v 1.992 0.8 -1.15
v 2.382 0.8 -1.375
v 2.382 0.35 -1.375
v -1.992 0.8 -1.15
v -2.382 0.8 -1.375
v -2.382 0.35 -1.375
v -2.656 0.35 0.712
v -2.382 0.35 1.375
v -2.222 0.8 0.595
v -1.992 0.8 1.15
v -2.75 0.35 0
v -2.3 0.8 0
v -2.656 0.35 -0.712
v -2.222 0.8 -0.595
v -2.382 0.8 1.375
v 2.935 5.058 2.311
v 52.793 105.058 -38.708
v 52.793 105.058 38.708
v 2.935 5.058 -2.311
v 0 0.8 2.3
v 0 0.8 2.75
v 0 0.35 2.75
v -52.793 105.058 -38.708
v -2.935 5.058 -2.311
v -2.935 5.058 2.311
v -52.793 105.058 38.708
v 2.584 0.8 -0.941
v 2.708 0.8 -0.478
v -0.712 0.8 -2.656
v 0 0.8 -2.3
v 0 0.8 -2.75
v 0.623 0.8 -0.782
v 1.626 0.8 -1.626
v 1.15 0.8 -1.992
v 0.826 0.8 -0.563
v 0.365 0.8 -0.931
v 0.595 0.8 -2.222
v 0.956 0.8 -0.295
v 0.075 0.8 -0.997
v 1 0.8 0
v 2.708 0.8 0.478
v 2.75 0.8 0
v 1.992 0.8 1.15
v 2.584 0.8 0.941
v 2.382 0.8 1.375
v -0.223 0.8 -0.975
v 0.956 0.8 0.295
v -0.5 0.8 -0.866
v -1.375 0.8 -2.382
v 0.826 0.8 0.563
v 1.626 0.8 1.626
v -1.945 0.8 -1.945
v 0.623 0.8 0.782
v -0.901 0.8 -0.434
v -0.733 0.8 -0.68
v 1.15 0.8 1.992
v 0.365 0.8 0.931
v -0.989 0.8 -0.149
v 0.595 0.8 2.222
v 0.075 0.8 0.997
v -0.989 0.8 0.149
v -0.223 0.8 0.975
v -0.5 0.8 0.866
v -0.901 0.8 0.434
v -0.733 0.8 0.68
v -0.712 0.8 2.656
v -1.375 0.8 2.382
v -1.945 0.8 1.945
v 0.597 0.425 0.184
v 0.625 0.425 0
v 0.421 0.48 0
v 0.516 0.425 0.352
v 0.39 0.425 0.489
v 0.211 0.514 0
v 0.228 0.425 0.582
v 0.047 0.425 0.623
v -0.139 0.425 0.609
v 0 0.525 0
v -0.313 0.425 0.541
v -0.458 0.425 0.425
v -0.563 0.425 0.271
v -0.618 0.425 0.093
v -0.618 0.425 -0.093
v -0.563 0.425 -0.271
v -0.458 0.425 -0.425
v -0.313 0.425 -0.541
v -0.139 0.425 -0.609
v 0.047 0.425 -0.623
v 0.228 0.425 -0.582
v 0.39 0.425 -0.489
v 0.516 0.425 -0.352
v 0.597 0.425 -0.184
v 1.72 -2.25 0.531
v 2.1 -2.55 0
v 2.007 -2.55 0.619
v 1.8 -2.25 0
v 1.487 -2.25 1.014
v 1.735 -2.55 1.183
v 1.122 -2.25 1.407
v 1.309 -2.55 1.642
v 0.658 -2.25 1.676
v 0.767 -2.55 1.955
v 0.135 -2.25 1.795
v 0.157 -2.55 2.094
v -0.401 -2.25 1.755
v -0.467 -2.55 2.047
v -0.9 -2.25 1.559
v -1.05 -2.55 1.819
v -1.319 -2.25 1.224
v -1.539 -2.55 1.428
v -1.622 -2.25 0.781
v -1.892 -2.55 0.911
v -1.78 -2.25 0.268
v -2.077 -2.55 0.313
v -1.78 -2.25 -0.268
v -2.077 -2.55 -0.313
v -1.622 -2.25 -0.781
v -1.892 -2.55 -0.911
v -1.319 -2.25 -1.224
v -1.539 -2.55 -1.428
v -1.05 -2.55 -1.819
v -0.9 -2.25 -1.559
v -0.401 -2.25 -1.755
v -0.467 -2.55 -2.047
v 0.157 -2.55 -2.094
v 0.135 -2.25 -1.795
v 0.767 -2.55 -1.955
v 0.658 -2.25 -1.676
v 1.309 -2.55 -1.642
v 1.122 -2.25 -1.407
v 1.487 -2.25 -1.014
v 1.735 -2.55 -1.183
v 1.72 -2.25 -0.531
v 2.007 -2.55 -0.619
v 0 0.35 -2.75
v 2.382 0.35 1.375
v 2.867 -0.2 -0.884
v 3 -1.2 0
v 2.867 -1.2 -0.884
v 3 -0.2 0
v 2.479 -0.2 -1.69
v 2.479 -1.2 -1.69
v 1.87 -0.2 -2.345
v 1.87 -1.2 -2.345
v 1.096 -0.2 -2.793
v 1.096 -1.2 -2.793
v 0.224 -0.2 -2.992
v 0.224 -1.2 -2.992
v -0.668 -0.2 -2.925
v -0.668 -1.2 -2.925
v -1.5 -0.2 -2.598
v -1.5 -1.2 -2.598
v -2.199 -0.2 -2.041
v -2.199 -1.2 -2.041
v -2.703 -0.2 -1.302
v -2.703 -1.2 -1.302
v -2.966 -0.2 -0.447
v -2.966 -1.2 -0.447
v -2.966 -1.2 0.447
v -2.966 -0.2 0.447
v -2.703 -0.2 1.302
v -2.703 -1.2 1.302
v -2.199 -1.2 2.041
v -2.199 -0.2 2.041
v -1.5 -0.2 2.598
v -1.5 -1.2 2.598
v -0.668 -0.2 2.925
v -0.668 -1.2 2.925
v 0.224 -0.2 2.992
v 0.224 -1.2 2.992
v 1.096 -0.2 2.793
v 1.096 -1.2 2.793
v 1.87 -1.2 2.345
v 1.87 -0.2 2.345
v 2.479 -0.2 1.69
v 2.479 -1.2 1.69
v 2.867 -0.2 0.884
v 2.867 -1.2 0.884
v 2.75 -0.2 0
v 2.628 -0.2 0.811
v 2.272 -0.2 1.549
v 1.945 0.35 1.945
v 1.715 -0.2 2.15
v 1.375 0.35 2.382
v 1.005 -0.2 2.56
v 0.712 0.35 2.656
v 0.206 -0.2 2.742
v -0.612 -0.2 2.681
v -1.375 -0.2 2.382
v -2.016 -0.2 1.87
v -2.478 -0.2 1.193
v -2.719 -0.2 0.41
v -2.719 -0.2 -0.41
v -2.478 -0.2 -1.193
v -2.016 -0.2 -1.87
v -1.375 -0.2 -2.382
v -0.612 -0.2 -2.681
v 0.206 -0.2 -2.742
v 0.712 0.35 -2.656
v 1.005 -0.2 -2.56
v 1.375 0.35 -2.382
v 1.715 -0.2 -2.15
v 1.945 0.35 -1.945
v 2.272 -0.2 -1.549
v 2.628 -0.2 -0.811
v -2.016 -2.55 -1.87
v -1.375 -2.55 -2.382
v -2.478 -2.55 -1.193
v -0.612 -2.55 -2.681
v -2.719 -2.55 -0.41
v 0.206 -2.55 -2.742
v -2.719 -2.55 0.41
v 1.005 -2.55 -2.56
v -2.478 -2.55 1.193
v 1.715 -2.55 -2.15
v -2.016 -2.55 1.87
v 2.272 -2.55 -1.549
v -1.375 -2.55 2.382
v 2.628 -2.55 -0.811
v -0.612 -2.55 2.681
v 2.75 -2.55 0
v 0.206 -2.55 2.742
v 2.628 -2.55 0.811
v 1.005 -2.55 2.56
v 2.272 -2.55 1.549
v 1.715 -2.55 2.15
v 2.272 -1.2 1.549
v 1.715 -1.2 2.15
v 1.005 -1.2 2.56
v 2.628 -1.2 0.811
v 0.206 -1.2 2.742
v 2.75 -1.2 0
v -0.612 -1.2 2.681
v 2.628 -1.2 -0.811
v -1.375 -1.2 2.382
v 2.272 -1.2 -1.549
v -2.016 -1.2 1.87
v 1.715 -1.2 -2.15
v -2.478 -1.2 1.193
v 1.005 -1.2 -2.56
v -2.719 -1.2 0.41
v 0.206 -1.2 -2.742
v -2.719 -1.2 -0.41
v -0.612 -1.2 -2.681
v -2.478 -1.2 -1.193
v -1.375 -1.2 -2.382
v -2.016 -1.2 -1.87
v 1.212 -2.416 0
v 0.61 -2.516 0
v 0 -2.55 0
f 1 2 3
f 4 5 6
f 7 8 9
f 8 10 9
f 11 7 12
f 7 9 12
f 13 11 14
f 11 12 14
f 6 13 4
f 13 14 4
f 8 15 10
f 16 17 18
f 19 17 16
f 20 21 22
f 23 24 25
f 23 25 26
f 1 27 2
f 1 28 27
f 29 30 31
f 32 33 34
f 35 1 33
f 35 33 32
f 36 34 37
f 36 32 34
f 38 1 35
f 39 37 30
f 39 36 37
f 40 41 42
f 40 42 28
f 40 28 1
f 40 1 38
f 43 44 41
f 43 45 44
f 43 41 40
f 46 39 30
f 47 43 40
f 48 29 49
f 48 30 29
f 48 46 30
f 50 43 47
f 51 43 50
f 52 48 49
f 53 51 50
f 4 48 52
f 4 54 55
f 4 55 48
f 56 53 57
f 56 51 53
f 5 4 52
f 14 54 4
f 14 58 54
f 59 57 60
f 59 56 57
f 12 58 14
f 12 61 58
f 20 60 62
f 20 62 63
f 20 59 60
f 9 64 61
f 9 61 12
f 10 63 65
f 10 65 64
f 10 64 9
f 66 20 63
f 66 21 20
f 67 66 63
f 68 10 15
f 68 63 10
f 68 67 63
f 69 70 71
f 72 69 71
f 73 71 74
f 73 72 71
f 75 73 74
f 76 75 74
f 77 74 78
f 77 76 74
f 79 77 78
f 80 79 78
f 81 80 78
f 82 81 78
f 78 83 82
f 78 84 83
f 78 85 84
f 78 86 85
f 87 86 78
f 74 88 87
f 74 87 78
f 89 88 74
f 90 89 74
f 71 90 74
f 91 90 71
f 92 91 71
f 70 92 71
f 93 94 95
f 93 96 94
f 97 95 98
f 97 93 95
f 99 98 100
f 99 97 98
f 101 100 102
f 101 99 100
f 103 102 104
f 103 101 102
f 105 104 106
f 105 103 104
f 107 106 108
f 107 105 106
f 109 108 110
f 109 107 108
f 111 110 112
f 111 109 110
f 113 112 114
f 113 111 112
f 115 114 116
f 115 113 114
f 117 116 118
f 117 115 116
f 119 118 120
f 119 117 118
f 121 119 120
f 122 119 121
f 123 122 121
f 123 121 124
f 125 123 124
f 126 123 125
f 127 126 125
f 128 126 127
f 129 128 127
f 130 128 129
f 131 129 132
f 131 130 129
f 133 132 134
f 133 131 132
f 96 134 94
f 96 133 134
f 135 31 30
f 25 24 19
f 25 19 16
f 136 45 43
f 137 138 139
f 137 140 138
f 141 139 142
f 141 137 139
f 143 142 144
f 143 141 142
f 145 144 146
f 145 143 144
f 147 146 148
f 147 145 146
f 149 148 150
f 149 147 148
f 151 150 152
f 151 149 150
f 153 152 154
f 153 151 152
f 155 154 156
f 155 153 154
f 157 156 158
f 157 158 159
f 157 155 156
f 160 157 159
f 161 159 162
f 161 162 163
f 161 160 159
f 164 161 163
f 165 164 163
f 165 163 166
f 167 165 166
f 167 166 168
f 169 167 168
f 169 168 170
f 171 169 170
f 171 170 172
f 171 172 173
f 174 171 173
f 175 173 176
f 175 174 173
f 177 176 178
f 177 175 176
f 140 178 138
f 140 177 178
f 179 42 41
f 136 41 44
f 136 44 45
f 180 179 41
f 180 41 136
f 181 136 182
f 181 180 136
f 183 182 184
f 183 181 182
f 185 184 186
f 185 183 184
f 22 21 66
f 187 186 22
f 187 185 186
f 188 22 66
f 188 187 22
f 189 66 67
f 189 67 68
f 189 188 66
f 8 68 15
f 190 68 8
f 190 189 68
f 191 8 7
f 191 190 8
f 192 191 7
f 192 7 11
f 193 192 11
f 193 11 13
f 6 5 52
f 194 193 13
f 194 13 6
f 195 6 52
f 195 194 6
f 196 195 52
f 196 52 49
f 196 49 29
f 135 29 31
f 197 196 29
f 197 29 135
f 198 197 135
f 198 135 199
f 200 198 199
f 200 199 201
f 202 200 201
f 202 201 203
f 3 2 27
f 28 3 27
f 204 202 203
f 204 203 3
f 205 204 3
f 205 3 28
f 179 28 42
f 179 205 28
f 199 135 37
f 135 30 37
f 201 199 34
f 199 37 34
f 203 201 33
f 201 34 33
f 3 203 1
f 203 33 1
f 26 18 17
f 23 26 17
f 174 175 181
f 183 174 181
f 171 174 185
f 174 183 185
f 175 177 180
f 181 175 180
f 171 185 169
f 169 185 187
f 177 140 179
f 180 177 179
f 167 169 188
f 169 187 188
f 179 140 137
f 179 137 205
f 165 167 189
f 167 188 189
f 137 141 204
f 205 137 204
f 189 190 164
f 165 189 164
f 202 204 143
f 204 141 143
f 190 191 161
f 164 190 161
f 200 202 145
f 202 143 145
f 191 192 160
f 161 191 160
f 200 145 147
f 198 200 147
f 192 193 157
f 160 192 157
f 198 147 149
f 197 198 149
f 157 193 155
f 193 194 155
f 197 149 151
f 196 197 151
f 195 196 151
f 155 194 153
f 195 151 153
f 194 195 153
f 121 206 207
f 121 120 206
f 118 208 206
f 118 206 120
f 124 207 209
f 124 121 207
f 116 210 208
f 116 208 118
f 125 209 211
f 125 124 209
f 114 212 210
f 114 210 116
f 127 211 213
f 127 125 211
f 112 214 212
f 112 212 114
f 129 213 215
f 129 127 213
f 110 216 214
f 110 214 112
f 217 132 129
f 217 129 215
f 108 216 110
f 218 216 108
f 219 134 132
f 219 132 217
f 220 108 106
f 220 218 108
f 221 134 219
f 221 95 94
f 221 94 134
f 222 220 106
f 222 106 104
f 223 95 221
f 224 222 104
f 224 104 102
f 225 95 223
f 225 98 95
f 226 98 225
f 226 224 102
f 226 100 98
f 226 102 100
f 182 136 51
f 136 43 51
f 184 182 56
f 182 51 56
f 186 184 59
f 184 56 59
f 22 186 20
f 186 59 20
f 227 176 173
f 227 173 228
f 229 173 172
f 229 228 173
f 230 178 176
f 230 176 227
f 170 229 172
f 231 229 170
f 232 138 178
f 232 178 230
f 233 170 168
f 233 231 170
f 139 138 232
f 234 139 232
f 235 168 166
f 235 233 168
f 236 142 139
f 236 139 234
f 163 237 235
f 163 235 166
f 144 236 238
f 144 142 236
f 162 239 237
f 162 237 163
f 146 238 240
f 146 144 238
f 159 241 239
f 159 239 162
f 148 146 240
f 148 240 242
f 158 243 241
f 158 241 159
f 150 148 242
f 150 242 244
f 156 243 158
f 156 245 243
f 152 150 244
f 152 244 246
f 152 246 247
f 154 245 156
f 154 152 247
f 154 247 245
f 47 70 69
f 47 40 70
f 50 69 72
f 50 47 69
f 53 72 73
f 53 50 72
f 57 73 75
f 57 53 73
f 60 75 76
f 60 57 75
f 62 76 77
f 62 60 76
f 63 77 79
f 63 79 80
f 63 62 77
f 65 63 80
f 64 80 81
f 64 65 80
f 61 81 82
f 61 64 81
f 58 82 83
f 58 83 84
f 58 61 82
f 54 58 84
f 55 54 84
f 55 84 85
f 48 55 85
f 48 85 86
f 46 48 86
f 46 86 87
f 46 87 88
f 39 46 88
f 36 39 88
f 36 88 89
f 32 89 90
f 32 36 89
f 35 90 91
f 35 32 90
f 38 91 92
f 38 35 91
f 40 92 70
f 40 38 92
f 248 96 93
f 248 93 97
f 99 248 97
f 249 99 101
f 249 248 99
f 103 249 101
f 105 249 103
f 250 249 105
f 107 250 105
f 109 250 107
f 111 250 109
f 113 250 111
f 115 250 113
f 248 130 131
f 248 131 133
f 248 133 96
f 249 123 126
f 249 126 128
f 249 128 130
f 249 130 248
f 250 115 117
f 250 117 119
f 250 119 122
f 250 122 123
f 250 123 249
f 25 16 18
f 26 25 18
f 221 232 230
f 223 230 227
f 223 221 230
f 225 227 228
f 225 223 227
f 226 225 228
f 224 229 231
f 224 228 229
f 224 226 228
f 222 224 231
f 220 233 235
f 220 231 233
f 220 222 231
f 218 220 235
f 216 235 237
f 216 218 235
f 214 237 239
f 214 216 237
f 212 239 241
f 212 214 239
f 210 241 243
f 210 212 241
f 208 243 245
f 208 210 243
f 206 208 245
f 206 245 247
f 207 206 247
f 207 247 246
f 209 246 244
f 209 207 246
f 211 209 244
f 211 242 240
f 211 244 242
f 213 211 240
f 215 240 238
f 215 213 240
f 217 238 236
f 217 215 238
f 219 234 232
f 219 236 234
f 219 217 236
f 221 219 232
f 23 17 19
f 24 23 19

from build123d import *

# Parameters (mm, degrees)
SKIZZE4_W             = 0.25
SKIZZE4_H             = 1
TOOLFACE_ANGLE        = 60
KREISMUSTER1_COUNT    = 3
FOV_3_6MM_F_2_9_DEPTH = 100
SKIZZE8_OUTSIDE_W     = 249.988
SKIZZE8_OUTSIDE_H     = 157.596
SKIZZE8_OUTSIDE_R     = 5
FOV2_DEPTH            = 39.708234414
FOV2_DEPTH_BACK       = 39.708234414


with BuildPart() as part:
    # Skizze3 → Body (revolve)
    with BuildSketch(Plane.XY):
        with BuildLine():
            Line((1, 0.8), (2.75, 0.8))
            Line((2.75, 0.8), (2.75, -2.55))
            Line((2.75, -2.55), (2.1, -2.55))
            Line((2.1, -2.55), (1.8, -2.25))
            ThreePointArc((1.8, -2.25), (0.91241438, -2.474486277), (0, -2.55))
            Line((0, -2.55), (0, 0.525))
            ThreePointArc((0, 0.525), (0.316474723, 0.499842016), (0.625, 0.425))
            Line((0.625, 0.425), (1, 0.8))
        make_face()
    revolve(axis=Axis((0, 0, 0), (0, -1, 0)))

    # Skizze4 → Thread (revolve)
    with BuildSketch(Plane.XY):
        with Locations((2.875, -0.7)):
            Rectangle(SKIZZE4_W, SKIZZE4_H)
    revolve(axis=Axis((0, 0, 0), (0, 1, 0)))

    # Skizze5 → Toolface (revolve, cut)
    with BuildSketch(Plane(origin=(0, 0, 0), x_dir=(0, 0, -1), z_dir=(1, 0, 0))):
        Polygon((2.75, 0.8), (2.75, 0.35), (2.3, 0.8), align=None)
    toolface = revolve(axis=Axis((0, 0, 0), (0, -1, 0)), revolution_arc=TOOLFACE_ANGLE, mode=Mode.SUBTRACT)

    # Kreismuster1: Toolface ×3 about axis
    kreismuster1_axis = Axis((0, 0, 0), (0, 1, 0))
    for i in range(1, KREISMUSTER1_COUNT):
        add(toolface.rotate(kreismuster1_axis, i * 360 / KREISMUSTER1_COUNT), mode=Mode.SUBTRACT)


with BuildPart() as body_2:
    # Skizze6 → FOV - 3,6mm f/2,9 (new body, symmetric)
    with BuildSketch(Plane(origin=(0, 0, 0), x_dir=(0, 0, -1), z_dir=(1, 0, 0))):
        Polygon((-2.311210988, 5.057826613), (-38.708234414, 105.057826613), (38.708234414, 105.057826613), (2.311210988, 5.057826613), align=None)
    extrude(amount=FOV_3_6MM_F_2_9_DEPTH, both=True)

    # Skizze8 outside → FOV2 (cut, two sides)
    with BuildSketch(Plane.XY) as fov2_sk:
        with Locations((0, 51.254)):
            Rectangle(SKIZZE8_OUTSIDE_W, SKIZZE8_OUTSIDE_H)
        Circle(SKIZZE8_OUTSIDE_R, mode=Mode.SUBTRACT)
        Polygon((-2.934842142, 5.057826613), (-52.793002948, 105.057826613), (52.793002948, 105.057826613), (2.934842142, 5.057826613), align=None, mode=Mode.SUBTRACT)
    extrude(amount=FOV2_DEPTH, mode=Mode.SUBTRACT)
    extrude(fov2_sk.sketch, amount=-FOV2_DEPTH_BACK, mode=Mode.SUBTRACT)


solid = Compound([part.part, body_2.part])
